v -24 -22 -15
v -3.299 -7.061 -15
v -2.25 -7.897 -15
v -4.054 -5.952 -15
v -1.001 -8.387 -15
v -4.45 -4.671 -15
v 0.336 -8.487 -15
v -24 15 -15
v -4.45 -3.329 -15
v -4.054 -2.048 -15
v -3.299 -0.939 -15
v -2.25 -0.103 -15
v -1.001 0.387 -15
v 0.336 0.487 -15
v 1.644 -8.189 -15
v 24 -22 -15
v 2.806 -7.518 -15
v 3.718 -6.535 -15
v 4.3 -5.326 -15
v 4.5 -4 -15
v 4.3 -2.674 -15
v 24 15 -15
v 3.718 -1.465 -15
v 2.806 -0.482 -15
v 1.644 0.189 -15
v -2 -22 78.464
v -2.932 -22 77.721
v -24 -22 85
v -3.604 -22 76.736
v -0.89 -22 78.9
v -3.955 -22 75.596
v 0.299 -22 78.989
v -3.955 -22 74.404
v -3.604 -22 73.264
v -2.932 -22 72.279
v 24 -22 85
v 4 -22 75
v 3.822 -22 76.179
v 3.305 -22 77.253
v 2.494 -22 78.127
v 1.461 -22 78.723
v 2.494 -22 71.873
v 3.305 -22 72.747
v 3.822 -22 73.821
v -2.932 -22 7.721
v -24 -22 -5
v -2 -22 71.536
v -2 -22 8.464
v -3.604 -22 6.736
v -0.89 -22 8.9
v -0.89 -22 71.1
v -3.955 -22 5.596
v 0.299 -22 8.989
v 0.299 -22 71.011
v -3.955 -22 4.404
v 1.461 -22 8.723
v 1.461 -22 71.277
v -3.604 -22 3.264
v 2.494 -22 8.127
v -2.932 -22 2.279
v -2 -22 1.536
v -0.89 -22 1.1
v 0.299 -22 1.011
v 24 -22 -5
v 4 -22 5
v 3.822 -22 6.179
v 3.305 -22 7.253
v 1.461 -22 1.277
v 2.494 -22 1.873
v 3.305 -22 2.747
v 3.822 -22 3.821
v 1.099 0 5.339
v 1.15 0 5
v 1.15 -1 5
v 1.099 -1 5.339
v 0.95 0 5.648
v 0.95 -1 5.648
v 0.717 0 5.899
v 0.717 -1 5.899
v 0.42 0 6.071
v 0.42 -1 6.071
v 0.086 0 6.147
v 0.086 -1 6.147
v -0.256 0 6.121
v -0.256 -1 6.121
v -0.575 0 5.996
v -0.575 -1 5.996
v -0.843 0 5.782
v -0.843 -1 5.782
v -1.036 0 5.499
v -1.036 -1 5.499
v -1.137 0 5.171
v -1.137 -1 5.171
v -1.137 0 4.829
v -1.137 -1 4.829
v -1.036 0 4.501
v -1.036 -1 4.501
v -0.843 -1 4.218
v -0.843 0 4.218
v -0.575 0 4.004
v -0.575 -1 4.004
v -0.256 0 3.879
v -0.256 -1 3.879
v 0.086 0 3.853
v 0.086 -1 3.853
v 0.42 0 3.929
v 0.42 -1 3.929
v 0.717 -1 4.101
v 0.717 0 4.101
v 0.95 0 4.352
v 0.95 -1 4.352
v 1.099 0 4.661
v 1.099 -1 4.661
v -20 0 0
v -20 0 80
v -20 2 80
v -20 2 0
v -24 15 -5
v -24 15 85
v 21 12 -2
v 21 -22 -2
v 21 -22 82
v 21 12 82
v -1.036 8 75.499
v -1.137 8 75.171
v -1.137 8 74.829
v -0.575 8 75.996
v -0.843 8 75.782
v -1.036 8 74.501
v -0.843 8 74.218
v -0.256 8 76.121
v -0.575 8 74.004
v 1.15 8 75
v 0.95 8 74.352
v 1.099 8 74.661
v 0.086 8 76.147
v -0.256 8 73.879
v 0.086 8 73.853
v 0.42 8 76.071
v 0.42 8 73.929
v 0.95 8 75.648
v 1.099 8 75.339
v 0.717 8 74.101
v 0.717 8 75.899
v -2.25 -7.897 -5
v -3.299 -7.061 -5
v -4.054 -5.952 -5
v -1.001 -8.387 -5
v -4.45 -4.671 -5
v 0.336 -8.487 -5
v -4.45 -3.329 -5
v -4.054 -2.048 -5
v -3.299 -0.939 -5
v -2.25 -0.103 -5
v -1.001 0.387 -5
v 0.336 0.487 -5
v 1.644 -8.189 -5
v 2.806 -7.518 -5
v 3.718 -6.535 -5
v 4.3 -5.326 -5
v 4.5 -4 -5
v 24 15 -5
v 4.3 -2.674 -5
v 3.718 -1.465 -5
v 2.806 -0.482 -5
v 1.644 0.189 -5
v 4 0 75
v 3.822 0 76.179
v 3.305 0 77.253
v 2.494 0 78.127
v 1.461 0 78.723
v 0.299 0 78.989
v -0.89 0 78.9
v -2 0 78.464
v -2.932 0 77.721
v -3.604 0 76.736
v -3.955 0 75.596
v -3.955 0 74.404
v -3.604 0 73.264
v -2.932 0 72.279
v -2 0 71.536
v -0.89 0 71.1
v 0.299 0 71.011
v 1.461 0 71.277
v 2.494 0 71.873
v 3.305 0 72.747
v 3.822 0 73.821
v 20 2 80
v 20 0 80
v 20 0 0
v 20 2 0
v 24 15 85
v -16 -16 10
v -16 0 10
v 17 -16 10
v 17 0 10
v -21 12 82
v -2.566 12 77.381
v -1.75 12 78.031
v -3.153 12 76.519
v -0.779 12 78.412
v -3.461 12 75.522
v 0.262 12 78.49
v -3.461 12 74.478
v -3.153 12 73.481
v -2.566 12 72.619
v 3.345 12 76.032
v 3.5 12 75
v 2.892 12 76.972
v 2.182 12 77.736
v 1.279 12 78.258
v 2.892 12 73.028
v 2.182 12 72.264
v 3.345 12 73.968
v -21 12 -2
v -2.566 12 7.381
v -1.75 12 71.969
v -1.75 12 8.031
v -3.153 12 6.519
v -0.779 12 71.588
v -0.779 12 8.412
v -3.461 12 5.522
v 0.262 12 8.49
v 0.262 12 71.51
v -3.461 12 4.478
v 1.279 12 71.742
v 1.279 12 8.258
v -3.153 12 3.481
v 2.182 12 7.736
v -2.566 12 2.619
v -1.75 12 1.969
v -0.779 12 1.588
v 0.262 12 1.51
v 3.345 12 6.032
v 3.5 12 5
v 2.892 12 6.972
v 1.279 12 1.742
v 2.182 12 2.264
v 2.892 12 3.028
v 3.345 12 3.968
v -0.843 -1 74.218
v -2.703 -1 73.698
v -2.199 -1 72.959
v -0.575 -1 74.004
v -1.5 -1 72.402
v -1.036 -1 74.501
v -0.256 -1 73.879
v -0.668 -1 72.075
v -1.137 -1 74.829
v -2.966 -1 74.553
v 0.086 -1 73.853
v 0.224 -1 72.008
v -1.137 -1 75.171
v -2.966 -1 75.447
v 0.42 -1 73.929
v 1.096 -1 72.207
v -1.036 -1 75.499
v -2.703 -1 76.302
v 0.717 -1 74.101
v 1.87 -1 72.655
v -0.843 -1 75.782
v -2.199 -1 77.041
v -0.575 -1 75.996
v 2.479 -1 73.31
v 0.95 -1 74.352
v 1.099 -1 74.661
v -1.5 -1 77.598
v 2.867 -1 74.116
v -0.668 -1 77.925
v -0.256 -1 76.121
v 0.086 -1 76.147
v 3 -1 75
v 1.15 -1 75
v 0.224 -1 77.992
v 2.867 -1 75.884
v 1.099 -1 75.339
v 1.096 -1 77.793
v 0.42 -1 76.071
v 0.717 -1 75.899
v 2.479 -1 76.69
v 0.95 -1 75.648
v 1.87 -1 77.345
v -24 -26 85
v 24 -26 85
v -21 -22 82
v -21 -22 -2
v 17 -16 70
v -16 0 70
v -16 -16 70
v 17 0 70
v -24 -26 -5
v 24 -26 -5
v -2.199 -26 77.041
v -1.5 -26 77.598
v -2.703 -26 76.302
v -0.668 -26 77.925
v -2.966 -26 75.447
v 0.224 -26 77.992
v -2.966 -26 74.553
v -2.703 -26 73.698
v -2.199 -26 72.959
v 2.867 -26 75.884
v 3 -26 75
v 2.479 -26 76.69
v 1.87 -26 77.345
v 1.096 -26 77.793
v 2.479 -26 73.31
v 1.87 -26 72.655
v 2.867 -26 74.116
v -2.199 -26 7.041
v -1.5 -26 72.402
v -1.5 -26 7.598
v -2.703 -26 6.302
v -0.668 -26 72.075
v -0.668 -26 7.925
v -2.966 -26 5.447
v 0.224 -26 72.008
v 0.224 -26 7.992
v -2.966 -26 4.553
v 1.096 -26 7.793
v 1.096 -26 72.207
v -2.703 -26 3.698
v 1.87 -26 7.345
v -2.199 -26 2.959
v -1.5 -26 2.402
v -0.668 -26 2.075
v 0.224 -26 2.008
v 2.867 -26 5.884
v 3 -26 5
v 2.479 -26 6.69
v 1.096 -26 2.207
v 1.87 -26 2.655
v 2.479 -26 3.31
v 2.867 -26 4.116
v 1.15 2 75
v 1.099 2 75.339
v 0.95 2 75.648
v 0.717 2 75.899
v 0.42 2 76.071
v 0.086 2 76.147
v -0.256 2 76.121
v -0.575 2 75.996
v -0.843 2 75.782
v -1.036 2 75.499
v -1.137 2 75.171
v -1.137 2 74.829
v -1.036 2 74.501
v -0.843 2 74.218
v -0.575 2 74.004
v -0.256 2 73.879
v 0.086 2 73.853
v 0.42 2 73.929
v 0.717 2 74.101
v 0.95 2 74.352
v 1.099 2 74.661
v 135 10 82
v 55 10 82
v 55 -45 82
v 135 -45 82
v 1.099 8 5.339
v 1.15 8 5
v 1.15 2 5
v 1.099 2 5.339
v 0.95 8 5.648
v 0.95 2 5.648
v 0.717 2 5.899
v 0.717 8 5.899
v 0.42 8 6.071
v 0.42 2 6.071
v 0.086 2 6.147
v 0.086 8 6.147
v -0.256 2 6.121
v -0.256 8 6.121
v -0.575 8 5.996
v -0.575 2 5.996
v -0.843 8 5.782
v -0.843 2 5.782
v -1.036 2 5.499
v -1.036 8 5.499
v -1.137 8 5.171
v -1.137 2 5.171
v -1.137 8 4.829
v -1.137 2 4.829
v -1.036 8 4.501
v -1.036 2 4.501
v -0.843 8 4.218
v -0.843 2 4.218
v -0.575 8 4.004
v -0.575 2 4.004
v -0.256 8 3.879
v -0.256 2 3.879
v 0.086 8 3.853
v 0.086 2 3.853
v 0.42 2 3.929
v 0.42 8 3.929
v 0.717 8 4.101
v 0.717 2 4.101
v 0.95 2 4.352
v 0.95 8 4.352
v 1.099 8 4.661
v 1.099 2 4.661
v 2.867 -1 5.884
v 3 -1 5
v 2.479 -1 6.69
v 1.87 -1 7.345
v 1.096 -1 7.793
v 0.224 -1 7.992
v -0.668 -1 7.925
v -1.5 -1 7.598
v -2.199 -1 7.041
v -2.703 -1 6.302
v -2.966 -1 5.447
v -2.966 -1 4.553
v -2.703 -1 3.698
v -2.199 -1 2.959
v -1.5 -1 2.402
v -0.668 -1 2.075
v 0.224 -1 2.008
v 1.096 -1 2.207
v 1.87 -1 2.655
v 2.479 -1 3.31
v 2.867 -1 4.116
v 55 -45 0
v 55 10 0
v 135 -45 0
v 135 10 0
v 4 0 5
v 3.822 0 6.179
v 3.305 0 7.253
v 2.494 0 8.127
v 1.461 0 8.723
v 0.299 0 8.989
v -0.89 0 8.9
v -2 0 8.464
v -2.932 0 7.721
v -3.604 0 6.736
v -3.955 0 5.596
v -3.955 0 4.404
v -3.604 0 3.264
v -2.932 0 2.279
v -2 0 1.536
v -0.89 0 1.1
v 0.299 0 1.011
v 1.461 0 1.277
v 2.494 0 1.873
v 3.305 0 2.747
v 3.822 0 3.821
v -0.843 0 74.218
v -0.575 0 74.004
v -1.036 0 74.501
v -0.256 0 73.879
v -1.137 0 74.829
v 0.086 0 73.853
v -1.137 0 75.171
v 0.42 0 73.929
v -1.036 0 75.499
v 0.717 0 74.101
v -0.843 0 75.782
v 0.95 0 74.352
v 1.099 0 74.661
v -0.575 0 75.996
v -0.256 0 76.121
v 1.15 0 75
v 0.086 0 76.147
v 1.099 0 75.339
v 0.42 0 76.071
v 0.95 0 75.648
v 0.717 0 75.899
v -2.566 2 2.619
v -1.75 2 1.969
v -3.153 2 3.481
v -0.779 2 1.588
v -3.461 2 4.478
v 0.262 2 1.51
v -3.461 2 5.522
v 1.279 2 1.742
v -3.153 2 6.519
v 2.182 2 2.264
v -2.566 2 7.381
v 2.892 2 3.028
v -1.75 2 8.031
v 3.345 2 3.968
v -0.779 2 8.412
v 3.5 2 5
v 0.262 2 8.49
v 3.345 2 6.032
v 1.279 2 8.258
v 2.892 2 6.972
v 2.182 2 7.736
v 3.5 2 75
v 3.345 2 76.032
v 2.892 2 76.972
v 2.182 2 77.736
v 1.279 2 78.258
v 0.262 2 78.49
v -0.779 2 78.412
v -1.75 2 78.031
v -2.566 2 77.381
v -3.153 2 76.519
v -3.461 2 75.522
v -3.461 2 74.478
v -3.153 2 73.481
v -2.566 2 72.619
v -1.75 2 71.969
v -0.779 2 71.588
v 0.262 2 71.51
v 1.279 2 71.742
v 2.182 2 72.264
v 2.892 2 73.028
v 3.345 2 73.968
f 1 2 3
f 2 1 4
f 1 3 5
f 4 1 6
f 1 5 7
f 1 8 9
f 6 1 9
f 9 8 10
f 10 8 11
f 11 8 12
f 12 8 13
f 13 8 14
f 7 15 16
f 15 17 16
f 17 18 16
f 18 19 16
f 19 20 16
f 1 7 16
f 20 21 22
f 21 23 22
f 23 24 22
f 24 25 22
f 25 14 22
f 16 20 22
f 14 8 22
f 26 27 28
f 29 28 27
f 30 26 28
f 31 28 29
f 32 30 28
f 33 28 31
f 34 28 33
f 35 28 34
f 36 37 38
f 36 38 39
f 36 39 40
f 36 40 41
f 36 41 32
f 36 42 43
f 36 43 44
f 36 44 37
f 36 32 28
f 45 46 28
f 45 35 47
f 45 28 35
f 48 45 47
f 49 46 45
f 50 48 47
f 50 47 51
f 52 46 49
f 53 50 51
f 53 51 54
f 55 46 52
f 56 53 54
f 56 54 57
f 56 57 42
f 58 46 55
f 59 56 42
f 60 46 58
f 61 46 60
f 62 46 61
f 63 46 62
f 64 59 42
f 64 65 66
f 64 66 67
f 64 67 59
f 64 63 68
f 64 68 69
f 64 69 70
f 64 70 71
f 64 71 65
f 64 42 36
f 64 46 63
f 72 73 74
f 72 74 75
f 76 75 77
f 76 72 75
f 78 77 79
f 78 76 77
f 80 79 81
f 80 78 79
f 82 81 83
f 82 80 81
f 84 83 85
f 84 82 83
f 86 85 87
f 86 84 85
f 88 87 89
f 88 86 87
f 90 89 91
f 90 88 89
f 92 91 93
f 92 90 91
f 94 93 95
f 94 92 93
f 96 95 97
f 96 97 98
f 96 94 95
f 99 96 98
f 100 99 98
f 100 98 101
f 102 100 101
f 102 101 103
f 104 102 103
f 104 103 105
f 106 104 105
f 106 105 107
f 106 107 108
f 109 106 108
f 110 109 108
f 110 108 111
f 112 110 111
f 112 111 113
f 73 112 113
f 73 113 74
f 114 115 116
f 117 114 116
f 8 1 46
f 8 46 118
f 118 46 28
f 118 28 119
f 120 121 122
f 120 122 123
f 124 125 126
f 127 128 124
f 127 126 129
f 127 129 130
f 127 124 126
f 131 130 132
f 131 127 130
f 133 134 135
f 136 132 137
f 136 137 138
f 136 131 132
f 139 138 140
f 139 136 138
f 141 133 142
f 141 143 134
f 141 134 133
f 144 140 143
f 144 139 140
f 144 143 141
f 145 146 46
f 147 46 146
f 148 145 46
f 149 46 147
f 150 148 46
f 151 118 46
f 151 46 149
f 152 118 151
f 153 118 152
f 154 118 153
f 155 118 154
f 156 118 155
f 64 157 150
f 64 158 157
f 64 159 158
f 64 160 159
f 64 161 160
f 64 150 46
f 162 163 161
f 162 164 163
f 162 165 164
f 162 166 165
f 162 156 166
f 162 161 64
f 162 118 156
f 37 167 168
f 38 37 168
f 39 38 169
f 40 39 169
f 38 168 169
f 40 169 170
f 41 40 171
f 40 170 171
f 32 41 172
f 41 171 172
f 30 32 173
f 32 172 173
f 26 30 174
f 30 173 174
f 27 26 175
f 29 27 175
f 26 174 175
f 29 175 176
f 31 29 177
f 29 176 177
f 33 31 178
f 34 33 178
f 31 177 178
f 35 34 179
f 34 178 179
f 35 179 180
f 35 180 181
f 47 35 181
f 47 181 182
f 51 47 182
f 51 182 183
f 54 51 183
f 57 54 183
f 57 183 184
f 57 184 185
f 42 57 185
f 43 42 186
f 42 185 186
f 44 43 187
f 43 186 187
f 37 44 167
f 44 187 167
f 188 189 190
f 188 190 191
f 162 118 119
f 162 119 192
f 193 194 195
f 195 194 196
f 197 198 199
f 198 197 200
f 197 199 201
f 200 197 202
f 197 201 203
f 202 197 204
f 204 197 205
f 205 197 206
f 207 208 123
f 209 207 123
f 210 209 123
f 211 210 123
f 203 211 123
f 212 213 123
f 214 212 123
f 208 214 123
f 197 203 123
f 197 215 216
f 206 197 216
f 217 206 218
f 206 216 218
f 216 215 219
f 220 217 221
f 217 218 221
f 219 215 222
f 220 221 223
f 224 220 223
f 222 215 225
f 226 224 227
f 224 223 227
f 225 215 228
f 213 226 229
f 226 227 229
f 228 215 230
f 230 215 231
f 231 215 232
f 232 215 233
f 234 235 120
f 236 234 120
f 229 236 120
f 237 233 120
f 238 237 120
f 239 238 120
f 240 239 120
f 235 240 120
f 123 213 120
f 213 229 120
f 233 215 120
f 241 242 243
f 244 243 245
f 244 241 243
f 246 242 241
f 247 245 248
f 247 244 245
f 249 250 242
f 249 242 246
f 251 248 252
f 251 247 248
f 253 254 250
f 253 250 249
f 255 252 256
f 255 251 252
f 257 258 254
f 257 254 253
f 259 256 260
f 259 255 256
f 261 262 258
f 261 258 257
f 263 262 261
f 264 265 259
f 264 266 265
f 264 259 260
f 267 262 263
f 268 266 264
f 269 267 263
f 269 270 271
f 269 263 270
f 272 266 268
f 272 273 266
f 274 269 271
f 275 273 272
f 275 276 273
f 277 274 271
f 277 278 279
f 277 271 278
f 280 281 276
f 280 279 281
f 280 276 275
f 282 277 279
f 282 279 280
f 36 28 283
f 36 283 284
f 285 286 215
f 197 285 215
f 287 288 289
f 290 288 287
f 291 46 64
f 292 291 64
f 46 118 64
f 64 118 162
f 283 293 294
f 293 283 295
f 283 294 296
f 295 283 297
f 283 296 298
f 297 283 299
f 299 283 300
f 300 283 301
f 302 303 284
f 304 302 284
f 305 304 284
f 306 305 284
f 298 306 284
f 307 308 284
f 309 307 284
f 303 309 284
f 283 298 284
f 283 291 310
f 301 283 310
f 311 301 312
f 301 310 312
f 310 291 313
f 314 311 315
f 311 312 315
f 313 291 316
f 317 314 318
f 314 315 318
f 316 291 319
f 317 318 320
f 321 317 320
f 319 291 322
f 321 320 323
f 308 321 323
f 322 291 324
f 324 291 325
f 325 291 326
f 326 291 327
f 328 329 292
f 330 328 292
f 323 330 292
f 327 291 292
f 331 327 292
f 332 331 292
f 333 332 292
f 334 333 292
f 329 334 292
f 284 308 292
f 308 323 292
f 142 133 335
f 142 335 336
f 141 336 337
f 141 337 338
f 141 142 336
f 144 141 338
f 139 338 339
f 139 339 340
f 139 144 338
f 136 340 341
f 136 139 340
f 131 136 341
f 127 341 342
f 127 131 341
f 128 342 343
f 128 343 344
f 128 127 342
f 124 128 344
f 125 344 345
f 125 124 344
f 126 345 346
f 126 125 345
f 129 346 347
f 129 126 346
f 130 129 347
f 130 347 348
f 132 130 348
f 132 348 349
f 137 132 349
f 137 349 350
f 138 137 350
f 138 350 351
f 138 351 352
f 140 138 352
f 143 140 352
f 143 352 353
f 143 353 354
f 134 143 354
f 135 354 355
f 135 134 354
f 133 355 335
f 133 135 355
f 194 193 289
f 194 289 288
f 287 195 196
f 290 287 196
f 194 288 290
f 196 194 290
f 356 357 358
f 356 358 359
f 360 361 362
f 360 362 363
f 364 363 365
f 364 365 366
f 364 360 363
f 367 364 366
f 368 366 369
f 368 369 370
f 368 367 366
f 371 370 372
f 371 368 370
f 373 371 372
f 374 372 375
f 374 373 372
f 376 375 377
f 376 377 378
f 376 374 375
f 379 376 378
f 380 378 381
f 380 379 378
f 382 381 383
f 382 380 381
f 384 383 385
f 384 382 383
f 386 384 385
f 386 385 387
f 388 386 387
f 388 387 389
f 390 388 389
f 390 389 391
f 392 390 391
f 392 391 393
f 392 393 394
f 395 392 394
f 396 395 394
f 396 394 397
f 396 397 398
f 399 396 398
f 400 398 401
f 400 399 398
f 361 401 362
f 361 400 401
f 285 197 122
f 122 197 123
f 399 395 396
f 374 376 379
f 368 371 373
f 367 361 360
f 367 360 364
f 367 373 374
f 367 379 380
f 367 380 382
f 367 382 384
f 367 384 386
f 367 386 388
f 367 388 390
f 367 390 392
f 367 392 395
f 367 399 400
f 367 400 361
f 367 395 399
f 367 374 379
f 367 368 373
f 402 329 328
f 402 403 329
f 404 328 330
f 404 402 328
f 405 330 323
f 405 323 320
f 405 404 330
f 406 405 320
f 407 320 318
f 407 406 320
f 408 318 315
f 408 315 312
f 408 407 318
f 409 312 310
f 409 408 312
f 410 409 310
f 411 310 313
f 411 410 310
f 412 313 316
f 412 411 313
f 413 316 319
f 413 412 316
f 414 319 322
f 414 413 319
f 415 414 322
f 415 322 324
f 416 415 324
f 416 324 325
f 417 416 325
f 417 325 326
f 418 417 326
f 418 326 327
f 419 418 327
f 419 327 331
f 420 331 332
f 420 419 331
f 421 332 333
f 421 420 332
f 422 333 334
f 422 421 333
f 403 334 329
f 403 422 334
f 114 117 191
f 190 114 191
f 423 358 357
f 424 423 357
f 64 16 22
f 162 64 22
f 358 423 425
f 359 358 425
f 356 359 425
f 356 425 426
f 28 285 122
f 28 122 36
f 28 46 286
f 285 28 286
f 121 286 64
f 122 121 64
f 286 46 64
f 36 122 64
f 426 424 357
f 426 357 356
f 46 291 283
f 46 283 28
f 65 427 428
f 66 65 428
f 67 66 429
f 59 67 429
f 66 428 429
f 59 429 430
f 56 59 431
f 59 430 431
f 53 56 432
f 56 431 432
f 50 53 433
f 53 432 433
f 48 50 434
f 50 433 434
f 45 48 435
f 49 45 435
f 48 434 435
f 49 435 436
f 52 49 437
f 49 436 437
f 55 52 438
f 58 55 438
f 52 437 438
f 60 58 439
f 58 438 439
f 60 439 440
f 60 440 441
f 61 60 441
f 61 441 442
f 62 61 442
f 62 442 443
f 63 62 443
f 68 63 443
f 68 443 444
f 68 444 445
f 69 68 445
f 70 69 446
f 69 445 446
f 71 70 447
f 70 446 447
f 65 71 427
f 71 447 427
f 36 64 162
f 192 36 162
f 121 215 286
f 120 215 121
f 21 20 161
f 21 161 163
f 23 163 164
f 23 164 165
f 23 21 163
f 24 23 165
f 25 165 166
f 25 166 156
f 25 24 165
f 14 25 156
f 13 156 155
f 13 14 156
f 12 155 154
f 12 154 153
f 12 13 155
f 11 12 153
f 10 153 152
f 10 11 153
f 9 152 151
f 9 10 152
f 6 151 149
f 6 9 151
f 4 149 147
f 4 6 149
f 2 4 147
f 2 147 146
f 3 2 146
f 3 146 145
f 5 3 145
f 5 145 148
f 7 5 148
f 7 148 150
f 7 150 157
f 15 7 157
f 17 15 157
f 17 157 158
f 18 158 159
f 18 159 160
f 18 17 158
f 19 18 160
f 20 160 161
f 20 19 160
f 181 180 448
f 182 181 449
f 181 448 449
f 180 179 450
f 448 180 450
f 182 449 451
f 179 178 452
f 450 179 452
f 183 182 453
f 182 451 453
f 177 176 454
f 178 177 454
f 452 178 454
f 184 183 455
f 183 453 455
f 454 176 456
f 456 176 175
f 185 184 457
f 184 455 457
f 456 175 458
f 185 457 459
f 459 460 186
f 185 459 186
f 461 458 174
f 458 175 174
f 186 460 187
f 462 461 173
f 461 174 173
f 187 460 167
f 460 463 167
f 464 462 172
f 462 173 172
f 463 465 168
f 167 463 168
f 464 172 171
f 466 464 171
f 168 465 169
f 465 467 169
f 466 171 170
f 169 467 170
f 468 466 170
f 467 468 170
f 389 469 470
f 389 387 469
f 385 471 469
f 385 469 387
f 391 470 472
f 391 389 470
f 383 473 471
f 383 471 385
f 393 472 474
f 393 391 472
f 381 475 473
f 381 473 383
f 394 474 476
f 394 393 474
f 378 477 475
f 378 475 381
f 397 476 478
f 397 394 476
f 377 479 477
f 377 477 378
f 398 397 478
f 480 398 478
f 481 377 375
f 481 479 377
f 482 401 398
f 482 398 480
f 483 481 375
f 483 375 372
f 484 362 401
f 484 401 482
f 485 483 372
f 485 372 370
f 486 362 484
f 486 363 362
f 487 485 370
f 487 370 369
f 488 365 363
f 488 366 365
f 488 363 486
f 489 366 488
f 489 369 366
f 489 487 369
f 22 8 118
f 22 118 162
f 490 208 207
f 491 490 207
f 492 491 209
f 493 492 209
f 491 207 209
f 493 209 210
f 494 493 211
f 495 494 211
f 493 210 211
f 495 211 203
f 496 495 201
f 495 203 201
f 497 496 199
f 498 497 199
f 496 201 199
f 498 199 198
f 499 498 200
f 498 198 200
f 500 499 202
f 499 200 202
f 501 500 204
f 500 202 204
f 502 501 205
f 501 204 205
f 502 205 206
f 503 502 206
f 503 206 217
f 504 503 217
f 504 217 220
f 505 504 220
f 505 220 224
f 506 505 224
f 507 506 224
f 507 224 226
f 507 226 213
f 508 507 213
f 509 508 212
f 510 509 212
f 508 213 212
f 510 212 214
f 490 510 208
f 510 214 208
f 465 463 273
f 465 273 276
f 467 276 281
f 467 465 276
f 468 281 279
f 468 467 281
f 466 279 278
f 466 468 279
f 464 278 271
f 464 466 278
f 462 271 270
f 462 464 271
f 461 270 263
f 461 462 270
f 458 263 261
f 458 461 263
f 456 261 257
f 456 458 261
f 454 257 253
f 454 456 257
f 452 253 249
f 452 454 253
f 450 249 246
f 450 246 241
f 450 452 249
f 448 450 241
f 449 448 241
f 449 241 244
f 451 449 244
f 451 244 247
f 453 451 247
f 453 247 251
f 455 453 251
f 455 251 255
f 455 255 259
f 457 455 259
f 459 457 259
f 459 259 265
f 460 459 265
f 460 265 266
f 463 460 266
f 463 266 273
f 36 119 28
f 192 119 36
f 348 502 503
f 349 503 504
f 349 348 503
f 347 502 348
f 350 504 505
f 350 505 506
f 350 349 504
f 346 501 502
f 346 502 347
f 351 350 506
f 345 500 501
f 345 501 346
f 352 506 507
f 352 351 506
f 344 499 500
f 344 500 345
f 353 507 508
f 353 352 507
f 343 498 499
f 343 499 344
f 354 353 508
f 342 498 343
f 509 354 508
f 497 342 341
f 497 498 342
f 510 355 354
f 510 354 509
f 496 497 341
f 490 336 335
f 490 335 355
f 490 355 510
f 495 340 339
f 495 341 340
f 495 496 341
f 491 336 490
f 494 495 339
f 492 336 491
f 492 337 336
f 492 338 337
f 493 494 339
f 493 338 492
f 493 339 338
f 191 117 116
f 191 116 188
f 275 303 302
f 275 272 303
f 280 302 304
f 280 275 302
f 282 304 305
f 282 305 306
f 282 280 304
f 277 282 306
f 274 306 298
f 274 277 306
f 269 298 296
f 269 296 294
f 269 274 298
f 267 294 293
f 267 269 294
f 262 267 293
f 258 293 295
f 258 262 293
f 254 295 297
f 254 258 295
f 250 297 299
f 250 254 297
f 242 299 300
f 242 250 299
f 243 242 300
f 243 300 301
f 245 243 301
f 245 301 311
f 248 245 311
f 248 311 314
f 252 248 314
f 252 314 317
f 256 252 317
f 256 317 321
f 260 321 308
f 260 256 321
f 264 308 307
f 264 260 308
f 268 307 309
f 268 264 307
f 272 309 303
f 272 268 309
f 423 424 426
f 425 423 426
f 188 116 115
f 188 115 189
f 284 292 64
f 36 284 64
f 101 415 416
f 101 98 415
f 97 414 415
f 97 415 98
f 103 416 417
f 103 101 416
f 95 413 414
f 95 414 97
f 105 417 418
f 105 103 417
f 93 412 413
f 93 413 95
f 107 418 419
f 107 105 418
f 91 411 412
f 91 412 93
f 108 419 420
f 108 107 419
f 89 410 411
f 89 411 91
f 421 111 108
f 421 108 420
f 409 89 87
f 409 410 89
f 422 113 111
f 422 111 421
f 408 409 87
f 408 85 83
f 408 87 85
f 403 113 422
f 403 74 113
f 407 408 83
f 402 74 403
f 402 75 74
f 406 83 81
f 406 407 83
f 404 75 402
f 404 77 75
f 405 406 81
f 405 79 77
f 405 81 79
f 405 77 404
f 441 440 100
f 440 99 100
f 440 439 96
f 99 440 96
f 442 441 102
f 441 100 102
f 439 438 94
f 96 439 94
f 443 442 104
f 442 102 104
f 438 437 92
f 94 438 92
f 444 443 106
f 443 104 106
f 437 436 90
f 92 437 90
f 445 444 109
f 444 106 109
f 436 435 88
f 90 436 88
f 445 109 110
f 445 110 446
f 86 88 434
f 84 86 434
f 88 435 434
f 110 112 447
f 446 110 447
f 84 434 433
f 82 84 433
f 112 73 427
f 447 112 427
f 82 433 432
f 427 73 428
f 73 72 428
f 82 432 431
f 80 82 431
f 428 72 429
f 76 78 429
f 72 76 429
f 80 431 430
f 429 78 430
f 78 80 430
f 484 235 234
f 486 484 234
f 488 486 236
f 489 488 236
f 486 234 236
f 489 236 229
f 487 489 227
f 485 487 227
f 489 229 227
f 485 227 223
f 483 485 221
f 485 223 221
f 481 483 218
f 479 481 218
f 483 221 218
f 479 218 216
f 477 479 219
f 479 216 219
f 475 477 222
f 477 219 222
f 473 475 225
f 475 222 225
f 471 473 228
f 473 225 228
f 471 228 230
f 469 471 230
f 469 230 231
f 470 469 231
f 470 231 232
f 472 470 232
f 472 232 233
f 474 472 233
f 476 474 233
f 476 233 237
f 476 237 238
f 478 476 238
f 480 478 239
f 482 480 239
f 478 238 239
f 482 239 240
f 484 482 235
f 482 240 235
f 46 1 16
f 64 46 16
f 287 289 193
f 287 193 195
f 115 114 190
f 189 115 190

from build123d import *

# Parameters (mm, degrees)
BOX_W                  = 40
BOX_H                  = 2
BOX_DEPTH              = 80
BOX001_W               = 33
BOX001_H               = 16
BOX001_DEPTH           = 60
BOX002_W               = 80
BOX002_H               = 55
BOX002_DEPTH           = 82
CYLINDER016_R          = 3
CYLINDER016_DEPTH      = 10
CYLINDER016_ROLL_ANGLE = 90
CYLINDER015_R          = 3
CYLINDER015_DEPTH      = 10
CYLINDER015_ROLL_ANGLE = 90
BOX005_W               = 48
BOX005_H               = 4
BOX005_DEPTH           = 90
CYLINDER014_R          = 3
CYLINDER014_DEPTH      = 22
CYLINDER014_ROLL_ANGLE = 90
CYLINDER012_R          = 1.15
CYLINDER012_DEPTH      = 6
CYLINDER012_ROLL_ANGLE = 90
CYLINDER011_R          = 4
CYLINDER011_DEPTH      = 22
CYLINDER011_ROLL_ANGLE = 90
CYLINDER_R             = 3
CYLINDER_DEPTH         = 22
CYLINDER_ROLL_ANGLE    = 90
CYLINDER013_R          = 1.15
CYLINDER013_DEPTH      = 6
CYLINDER013_ROLL_ANGLE = 90
CYLINDER010_R          = 4
CYLINDER010_DEPTH      = 22
CYLINDER010_ROLL_ANGLE = 90
CYLINDER005_R          = 1.15
CYLINDER005_DEPTH      = 6
CYLINDER005_ROLL_ANGLE = 90
CYLINDER004_R          = 1.15
CYLINDER004_DEPTH      = 6
CYLINDER004_ROLL_ANGLE = 90
CYLINDER003_R          = 3.5
CYLINDER003_DEPTH      = 10
CYLINDER003_ROLL_ANGLE = 90
CYLINDER002_R          = 3.5
CYLINDER002_DEPTH      = 10
CYLINDER002_ROLL_ANGLE = 90
BOX004_W               = 42
BOX004_H               = 34
BOX004_DEPTH           = 84
BOX003_W               = 48
BOX003_H               = 37
BOX003_DEPTH           = 90
CYLINDER017_R          = 4.5
CYLINDER017_DEPTH      = 10
BOX006_W               = 48
BOX006_H               = 37
BOX006_DEPTH           = 10


with BuildPart() as pcb:
    # Box → Box (new body)
    with BuildSketch(Plane(origin=(-20, 0, 0), x_dir=(1, 0, 0), z_dir=(0, 0, 1))):
        with Locations((20, 1)):
            Rectangle(BOX_W, BOX_H)
    extrude(amount=BOX_DEPTH)


with BuildPart() as aa_battery:
    # Box001 → Box001 (new body)
    with BuildSketch(Plane(origin=(-16, -16, 10), x_dir=(1, 0, 0), z_dir=(0, 0, 1))):
        with Locations((16.5, 8)):
            Rectangle(BOX001_W, BOX001_H)
    extrude(amount=BOX001_DEPTH)


with BuildPart() as g366:
    # Box002 → Box002 (new body)
    with BuildSketch(Plane(origin=(55, -45, 0), x_dir=(1, 0, 0), z_dir=(0, 0, 1))):
        with Locations((40, 27.5)):
            Rectangle(BOX002_W, BOX002_H)
    extrude(amount=BOX002_DEPTH)


with BuildPart() as back_mount_cut004:
    # Cylinder016 → Cylinder016 (new body)
    with BuildSketch(Plane.XY):
        Circle(CYLINDER016_R)
    extrude(amount=CYLINDER016_DEPTH)


with BuildPart() as back_mount_cut004_1:
    # Cylinder016 roll: moved
    add(back_mount_cut004.part.rotate(Axis((0, 0, 0), (1, 0, 0)), CYLINDER016_ROLL_ANGLE))


with BuildPart() as back_mount_cut004_2:
    # Cylinder016 placement: moved
    add(back_mount_cut004_1.part.moved(Location((0, -16, 5))))


with BuildPart() as fusion006:
    # Cylinder015 → Cylinder015 (new body)
    with BuildSketch(Plane.XY):
        Circle(CYLINDER015_R)
    extrude(amount=CYLINDER015_DEPTH)


with BuildPart() as fusion006_1:
    # Cylinder015 roll: moved
    add(fusion006.part.rotate(Axis((0, 0, 0), (1, 0, 0)), CYLINDER015_ROLL_ANGLE))


with BuildPart() as fusion006_2:
    # Cylinder015 placement: moved
    add(fusion006_1.part.moved(Location((0, -16, 75))))

    # Fusion006: union Back_Mount_cut004
    add(back_mount_cut004_2.part)


with BuildPart() as cut003:
    # Box005 → Box005 (new body)
    with BuildSketch(Plane(origin=(-24, -26, -5), x_dir=(1, 0, 0), z_dir=(0, 0, 1))):
        with Locations((24, 2)):
            Rectangle(BOX005_W, BOX005_H)
    extrude(amount=BOX005_DEPTH)

    # Cut003: cut Fusion006
    add(fusion006_2.part, mode=Mode.SUBTRACT)


with BuildPart() as cylinder014:
    # Cylinder014 → Cylinder014 (new body)
    with BuildSketch(Plane.XY):
        Circle(CYLINDER014_R)
    extrude(amount=CYLINDER014_DEPTH)


with BuildPart() as cylinder014_1:
    # Cylinder014 roll: moved
    add(cylinder014.part.rotate(Axis((0, 0, 0), (1, 0, 0)), CYLINDER014_ROLL_ANGLE))


with BuildPart() as cylinder014_2:
    # Cylinder014 placement: moved
    add(cylinder014_1.part.moved(Location((0, -1, 5))))


with BuildPart() as fusion004:
    # Cylinder012 → Cylinder012 (new body)
    with BuildSketch(Plane.XY):
        Circle(CYLINDER012_R)
    extrude(amount=CYLINDER012_DEPTH)


with BuildPart() as fusion004_1:
    # Cylinder012 roll: moved
    add(fusion004.part.rotate(Axis((0, 0, 0), (1, 0, 0)), CYLINDER012_ROLL_ANGLE))


with BuildPart() as fusion004_2:
    # Cylinder012 placement: moved
    add(fusion004_1.part.moved(Location((0, 5, 5))))

    # Fusion004: union Cylinder014
    add(cylinder014_2.part)


with BuildPart() as cut001:
    # Cylinder011 → Cylinder011 (new body)
    with BuildSketch(Plane.XY):
        Circle(CYLINDER011_R)
    extrude(amount=CYLINDER011_DEPTH)


with BuildPart() as cut001_1:
    # Cylinder011 roll: moved
    add(cut001.part.rotate(Axis((0, 0, 0), (1, 0, 0)), CYLINDER011_ROLL_ANGLE))


with BuildPart() as cut001_2:
    # Cylinder011 placement: moved
    add(cut001_1.part.moved(Location((0, 0, 5))))

    # Cut001: cut Fusion004
    add(fusion004_2.part, mode=Mode.SUBTRACT)


with BuildPart() as cylinder:
    # Cylinder → Cylinder (new body)
    with BuildSketch(Plane.XY):
        Circle(CYLINDER_R)
    extrude(amount=CYLINDER_DEPTH)


with BuildPart() as cylinder_1:
    # Cylinder roll: moved
    add(cylinder.part.rotate(Axis((0, 0, 0), (1, 0, 0)), CYLINDER_ROLL_ANGLE))


with BuildPart() as cylinder_2:
    # Cylinder placement: moved
    add(cylinder_1.part.moved(Location((0, -1, 75))))


with BuildPart() as fusion:
    # Cylinder013 → Cylinder013 (new body)
    with BuildSketch(Plane.XY):
        Circle(CYLINDER013_R)
    extrude(amount=CYLINDER013_DEPTH)


with BuildPart() as fusion_1:
    # Cylinder013 roll: moved
    add(fusion.part.rotate(Axis((0, 0, 0), (1, 0, 0)), CYLINDER013_ROLL_ANGLE))


with BuildPart() as fusion_2:
    # Cylinder013 placement: moved
    add(fusion_1.part.moved(Location((0, 5, 75))))

    # Fusion: union Cylinder
    add(cylinder_2.part)


with BuildPart() as back:
    # Cylinder010 → Cylinder010 (new body)
    with BuildSketch(Plane.XY):
        Circle(CYLINDER010_R)
    extrude(amount=CYLINDER010_DEPTH)


with BuildPart() as back_1:
    # Cylinder010 roll: moved
    add(back.part.rotate(Axis((0, 0, 0), (1, 0, 0)), CYLINDER010_ROLL_ANGLE))


with BuildPart() as back_2:
    # Cylinder010 placement: moved
    add(back_1.part.moved(Location((0, 0, 75))))

    # Cut002: cut Fusion
    add(fusion_2.part, mode=Mode.SUBTRACT)

    # Fusion005: union Cut001
    add(cut001_2.part)

    # Fusion007: union Cut003
    add(cut003.part)


with BuildPart() as pcb_mount_cut2:
    # Cylinder005 → Cylinder005 (new body)
    with BuildSketch(Plane.XY):
        Circle(CYLINDER005_R)
    extrude(amount=CYLINDER005_DEPTH)


with BuildPart() as pcb_mount_cut2_1:
    # Cylinder005 roll: moved
    add(pcb_mount_cut2.part.rotate(Axis((0, 0, 0), (1, 0, 0)), CYLINDER005_ROLL_ANGLE))


with BuildPart() as pcb_mount_cut2_2:
    # Cylinder005 placement: moved
    add(pcb_mount_cut2_1.part.moved(Location((0, 8, 5))))


with BuildPart() as fusion003:
    # Cylinder004 → Cylinder004 (new body)
    with BuildSketch(Plane.XY):
        Circle(CYLINDER004_R)
    extrude(amount=CYLINDER004_DEPTH)


with BuildPart() as fusion003_1:
    # Cylinder004 roll: moved
    add(fusion003.part.rotate(Axis((0, 0, 0), (1, 0, 0)), CYLINDER004_ROLL_ANGLE))


with BuildPart() as fusion003_2:
    # Cylinder004 placement: moved
    add(fusion003_1.part.moved(Location((0, 8, 75))))

    # Fusion003: union PCB Mount_cut2
    add(pcb_mount_cut2_2.part)


with BuildPart() as pcb_mount2:
    # Cylinder003 → Cylinder003 (new body)
    with BuildSketch(Plane.XY):
        Circle(CYLINDER003_R)
    extrude(amount=CYLINDER003_DEPTH)


with BuildPart() as pcb_mount2_1:
    # Cylinder003 roll: moved
    add(pcb_mount2.part.rotate(Axis((0, 0, 0), (1, 0, 0)), CYLINDER003_ROLL_ANGLE))


with BuildPart() as pcb_mount2_2:
    # Cylinder003 placement: moved
    add(pcb_mount2_1.part.moved(Location((0, 12, 5))))


with BuildPart() as cut004:
    # Cylinder002 → Cylinder002 (new body)
    with BuildSketch(Plane.XY):
        Circle(CYLINDER002_R)
    extrude(amount=CYLINDER002_DEPTH)


with BuildPart() as cut004_1:
    # Cylinder002 roll: moved
    add(cut004.part.rotate(Axis((0, 0, 0), (1, 0, 0)), CYLINDER002_ROLL_ANGLE))


with BuildPart() as cut004_2:
    # Cylinder002 placement: moved
    add(cut004_1.part.moved(Location((0, 12, 75))))

    # Fusion008: union PCB Mount2
    add(pcb_mount2_2.part)

    # Cut004: cut Fusion003
    add(fusion003_2.part, mode=Mode.SUBTRACT)


with BuildPart() as cube001:
    # Box004 → Box004 (new body)
    with BuildSketch(Plane(origin=(-21, -22, -2), x_dir=(1, 0, 0), z_dir=(0, 0, 1))):
        with Locations((21, 17)):
            Rectangle(BOX004_W, BOX004_H)
    extrude(amount=BOX004_DEPTH)


with BuildPart() as front:
    # Box003 → Box003 (new body)
    with BuildSketch(Plane(origin=(-24, -22, -5), x_dir=(1, 0, 0), z_dir=(0, 0, 1))):
        with Locations((24, 18.5)):
            Rectangle(BOX003_W, BOX003_H)
    extrude(amount=BOX003_DEPTH)

    # Cut: cut Cube001
    add(cube001.part, mode=Mode.SUBTRACT)

    # Fusion009: union Cut004
    add(cut004_2.part)


with BuildPart() as cylinder017:
    # Cylinder017 → Cylinder017 (new body)
    with BuildSketch(Plane(origin=(0, -4, -15), x_dir=(1, 0, 0), z_dir=(0, 0, 1))):
        Circle(CYLINDER017_R)
    extrude(amount=CYLINDER017_DEPTH)


with BuildPart() as basewcut:
    # Box006 → Box006 (new body)
    with BuildSketch(Plane(origin=(-24, -22, -15), x_dir=(1, 0, 0), z_dir=(0, 0, 1))):
        with Locations((24, 18.5)):
            Rectangle(BOX006_W, BOX006_H)
    extrude(amount=BOX006_DEPTH)

    # Cut005: cut Cylinder017
    add(cylinder017.part, mode=Mode.SUBTRACT)


solid = Compound([pcb.part, aa_battery.part, g366.part, back_2.part, front.part, basewcut.part])
